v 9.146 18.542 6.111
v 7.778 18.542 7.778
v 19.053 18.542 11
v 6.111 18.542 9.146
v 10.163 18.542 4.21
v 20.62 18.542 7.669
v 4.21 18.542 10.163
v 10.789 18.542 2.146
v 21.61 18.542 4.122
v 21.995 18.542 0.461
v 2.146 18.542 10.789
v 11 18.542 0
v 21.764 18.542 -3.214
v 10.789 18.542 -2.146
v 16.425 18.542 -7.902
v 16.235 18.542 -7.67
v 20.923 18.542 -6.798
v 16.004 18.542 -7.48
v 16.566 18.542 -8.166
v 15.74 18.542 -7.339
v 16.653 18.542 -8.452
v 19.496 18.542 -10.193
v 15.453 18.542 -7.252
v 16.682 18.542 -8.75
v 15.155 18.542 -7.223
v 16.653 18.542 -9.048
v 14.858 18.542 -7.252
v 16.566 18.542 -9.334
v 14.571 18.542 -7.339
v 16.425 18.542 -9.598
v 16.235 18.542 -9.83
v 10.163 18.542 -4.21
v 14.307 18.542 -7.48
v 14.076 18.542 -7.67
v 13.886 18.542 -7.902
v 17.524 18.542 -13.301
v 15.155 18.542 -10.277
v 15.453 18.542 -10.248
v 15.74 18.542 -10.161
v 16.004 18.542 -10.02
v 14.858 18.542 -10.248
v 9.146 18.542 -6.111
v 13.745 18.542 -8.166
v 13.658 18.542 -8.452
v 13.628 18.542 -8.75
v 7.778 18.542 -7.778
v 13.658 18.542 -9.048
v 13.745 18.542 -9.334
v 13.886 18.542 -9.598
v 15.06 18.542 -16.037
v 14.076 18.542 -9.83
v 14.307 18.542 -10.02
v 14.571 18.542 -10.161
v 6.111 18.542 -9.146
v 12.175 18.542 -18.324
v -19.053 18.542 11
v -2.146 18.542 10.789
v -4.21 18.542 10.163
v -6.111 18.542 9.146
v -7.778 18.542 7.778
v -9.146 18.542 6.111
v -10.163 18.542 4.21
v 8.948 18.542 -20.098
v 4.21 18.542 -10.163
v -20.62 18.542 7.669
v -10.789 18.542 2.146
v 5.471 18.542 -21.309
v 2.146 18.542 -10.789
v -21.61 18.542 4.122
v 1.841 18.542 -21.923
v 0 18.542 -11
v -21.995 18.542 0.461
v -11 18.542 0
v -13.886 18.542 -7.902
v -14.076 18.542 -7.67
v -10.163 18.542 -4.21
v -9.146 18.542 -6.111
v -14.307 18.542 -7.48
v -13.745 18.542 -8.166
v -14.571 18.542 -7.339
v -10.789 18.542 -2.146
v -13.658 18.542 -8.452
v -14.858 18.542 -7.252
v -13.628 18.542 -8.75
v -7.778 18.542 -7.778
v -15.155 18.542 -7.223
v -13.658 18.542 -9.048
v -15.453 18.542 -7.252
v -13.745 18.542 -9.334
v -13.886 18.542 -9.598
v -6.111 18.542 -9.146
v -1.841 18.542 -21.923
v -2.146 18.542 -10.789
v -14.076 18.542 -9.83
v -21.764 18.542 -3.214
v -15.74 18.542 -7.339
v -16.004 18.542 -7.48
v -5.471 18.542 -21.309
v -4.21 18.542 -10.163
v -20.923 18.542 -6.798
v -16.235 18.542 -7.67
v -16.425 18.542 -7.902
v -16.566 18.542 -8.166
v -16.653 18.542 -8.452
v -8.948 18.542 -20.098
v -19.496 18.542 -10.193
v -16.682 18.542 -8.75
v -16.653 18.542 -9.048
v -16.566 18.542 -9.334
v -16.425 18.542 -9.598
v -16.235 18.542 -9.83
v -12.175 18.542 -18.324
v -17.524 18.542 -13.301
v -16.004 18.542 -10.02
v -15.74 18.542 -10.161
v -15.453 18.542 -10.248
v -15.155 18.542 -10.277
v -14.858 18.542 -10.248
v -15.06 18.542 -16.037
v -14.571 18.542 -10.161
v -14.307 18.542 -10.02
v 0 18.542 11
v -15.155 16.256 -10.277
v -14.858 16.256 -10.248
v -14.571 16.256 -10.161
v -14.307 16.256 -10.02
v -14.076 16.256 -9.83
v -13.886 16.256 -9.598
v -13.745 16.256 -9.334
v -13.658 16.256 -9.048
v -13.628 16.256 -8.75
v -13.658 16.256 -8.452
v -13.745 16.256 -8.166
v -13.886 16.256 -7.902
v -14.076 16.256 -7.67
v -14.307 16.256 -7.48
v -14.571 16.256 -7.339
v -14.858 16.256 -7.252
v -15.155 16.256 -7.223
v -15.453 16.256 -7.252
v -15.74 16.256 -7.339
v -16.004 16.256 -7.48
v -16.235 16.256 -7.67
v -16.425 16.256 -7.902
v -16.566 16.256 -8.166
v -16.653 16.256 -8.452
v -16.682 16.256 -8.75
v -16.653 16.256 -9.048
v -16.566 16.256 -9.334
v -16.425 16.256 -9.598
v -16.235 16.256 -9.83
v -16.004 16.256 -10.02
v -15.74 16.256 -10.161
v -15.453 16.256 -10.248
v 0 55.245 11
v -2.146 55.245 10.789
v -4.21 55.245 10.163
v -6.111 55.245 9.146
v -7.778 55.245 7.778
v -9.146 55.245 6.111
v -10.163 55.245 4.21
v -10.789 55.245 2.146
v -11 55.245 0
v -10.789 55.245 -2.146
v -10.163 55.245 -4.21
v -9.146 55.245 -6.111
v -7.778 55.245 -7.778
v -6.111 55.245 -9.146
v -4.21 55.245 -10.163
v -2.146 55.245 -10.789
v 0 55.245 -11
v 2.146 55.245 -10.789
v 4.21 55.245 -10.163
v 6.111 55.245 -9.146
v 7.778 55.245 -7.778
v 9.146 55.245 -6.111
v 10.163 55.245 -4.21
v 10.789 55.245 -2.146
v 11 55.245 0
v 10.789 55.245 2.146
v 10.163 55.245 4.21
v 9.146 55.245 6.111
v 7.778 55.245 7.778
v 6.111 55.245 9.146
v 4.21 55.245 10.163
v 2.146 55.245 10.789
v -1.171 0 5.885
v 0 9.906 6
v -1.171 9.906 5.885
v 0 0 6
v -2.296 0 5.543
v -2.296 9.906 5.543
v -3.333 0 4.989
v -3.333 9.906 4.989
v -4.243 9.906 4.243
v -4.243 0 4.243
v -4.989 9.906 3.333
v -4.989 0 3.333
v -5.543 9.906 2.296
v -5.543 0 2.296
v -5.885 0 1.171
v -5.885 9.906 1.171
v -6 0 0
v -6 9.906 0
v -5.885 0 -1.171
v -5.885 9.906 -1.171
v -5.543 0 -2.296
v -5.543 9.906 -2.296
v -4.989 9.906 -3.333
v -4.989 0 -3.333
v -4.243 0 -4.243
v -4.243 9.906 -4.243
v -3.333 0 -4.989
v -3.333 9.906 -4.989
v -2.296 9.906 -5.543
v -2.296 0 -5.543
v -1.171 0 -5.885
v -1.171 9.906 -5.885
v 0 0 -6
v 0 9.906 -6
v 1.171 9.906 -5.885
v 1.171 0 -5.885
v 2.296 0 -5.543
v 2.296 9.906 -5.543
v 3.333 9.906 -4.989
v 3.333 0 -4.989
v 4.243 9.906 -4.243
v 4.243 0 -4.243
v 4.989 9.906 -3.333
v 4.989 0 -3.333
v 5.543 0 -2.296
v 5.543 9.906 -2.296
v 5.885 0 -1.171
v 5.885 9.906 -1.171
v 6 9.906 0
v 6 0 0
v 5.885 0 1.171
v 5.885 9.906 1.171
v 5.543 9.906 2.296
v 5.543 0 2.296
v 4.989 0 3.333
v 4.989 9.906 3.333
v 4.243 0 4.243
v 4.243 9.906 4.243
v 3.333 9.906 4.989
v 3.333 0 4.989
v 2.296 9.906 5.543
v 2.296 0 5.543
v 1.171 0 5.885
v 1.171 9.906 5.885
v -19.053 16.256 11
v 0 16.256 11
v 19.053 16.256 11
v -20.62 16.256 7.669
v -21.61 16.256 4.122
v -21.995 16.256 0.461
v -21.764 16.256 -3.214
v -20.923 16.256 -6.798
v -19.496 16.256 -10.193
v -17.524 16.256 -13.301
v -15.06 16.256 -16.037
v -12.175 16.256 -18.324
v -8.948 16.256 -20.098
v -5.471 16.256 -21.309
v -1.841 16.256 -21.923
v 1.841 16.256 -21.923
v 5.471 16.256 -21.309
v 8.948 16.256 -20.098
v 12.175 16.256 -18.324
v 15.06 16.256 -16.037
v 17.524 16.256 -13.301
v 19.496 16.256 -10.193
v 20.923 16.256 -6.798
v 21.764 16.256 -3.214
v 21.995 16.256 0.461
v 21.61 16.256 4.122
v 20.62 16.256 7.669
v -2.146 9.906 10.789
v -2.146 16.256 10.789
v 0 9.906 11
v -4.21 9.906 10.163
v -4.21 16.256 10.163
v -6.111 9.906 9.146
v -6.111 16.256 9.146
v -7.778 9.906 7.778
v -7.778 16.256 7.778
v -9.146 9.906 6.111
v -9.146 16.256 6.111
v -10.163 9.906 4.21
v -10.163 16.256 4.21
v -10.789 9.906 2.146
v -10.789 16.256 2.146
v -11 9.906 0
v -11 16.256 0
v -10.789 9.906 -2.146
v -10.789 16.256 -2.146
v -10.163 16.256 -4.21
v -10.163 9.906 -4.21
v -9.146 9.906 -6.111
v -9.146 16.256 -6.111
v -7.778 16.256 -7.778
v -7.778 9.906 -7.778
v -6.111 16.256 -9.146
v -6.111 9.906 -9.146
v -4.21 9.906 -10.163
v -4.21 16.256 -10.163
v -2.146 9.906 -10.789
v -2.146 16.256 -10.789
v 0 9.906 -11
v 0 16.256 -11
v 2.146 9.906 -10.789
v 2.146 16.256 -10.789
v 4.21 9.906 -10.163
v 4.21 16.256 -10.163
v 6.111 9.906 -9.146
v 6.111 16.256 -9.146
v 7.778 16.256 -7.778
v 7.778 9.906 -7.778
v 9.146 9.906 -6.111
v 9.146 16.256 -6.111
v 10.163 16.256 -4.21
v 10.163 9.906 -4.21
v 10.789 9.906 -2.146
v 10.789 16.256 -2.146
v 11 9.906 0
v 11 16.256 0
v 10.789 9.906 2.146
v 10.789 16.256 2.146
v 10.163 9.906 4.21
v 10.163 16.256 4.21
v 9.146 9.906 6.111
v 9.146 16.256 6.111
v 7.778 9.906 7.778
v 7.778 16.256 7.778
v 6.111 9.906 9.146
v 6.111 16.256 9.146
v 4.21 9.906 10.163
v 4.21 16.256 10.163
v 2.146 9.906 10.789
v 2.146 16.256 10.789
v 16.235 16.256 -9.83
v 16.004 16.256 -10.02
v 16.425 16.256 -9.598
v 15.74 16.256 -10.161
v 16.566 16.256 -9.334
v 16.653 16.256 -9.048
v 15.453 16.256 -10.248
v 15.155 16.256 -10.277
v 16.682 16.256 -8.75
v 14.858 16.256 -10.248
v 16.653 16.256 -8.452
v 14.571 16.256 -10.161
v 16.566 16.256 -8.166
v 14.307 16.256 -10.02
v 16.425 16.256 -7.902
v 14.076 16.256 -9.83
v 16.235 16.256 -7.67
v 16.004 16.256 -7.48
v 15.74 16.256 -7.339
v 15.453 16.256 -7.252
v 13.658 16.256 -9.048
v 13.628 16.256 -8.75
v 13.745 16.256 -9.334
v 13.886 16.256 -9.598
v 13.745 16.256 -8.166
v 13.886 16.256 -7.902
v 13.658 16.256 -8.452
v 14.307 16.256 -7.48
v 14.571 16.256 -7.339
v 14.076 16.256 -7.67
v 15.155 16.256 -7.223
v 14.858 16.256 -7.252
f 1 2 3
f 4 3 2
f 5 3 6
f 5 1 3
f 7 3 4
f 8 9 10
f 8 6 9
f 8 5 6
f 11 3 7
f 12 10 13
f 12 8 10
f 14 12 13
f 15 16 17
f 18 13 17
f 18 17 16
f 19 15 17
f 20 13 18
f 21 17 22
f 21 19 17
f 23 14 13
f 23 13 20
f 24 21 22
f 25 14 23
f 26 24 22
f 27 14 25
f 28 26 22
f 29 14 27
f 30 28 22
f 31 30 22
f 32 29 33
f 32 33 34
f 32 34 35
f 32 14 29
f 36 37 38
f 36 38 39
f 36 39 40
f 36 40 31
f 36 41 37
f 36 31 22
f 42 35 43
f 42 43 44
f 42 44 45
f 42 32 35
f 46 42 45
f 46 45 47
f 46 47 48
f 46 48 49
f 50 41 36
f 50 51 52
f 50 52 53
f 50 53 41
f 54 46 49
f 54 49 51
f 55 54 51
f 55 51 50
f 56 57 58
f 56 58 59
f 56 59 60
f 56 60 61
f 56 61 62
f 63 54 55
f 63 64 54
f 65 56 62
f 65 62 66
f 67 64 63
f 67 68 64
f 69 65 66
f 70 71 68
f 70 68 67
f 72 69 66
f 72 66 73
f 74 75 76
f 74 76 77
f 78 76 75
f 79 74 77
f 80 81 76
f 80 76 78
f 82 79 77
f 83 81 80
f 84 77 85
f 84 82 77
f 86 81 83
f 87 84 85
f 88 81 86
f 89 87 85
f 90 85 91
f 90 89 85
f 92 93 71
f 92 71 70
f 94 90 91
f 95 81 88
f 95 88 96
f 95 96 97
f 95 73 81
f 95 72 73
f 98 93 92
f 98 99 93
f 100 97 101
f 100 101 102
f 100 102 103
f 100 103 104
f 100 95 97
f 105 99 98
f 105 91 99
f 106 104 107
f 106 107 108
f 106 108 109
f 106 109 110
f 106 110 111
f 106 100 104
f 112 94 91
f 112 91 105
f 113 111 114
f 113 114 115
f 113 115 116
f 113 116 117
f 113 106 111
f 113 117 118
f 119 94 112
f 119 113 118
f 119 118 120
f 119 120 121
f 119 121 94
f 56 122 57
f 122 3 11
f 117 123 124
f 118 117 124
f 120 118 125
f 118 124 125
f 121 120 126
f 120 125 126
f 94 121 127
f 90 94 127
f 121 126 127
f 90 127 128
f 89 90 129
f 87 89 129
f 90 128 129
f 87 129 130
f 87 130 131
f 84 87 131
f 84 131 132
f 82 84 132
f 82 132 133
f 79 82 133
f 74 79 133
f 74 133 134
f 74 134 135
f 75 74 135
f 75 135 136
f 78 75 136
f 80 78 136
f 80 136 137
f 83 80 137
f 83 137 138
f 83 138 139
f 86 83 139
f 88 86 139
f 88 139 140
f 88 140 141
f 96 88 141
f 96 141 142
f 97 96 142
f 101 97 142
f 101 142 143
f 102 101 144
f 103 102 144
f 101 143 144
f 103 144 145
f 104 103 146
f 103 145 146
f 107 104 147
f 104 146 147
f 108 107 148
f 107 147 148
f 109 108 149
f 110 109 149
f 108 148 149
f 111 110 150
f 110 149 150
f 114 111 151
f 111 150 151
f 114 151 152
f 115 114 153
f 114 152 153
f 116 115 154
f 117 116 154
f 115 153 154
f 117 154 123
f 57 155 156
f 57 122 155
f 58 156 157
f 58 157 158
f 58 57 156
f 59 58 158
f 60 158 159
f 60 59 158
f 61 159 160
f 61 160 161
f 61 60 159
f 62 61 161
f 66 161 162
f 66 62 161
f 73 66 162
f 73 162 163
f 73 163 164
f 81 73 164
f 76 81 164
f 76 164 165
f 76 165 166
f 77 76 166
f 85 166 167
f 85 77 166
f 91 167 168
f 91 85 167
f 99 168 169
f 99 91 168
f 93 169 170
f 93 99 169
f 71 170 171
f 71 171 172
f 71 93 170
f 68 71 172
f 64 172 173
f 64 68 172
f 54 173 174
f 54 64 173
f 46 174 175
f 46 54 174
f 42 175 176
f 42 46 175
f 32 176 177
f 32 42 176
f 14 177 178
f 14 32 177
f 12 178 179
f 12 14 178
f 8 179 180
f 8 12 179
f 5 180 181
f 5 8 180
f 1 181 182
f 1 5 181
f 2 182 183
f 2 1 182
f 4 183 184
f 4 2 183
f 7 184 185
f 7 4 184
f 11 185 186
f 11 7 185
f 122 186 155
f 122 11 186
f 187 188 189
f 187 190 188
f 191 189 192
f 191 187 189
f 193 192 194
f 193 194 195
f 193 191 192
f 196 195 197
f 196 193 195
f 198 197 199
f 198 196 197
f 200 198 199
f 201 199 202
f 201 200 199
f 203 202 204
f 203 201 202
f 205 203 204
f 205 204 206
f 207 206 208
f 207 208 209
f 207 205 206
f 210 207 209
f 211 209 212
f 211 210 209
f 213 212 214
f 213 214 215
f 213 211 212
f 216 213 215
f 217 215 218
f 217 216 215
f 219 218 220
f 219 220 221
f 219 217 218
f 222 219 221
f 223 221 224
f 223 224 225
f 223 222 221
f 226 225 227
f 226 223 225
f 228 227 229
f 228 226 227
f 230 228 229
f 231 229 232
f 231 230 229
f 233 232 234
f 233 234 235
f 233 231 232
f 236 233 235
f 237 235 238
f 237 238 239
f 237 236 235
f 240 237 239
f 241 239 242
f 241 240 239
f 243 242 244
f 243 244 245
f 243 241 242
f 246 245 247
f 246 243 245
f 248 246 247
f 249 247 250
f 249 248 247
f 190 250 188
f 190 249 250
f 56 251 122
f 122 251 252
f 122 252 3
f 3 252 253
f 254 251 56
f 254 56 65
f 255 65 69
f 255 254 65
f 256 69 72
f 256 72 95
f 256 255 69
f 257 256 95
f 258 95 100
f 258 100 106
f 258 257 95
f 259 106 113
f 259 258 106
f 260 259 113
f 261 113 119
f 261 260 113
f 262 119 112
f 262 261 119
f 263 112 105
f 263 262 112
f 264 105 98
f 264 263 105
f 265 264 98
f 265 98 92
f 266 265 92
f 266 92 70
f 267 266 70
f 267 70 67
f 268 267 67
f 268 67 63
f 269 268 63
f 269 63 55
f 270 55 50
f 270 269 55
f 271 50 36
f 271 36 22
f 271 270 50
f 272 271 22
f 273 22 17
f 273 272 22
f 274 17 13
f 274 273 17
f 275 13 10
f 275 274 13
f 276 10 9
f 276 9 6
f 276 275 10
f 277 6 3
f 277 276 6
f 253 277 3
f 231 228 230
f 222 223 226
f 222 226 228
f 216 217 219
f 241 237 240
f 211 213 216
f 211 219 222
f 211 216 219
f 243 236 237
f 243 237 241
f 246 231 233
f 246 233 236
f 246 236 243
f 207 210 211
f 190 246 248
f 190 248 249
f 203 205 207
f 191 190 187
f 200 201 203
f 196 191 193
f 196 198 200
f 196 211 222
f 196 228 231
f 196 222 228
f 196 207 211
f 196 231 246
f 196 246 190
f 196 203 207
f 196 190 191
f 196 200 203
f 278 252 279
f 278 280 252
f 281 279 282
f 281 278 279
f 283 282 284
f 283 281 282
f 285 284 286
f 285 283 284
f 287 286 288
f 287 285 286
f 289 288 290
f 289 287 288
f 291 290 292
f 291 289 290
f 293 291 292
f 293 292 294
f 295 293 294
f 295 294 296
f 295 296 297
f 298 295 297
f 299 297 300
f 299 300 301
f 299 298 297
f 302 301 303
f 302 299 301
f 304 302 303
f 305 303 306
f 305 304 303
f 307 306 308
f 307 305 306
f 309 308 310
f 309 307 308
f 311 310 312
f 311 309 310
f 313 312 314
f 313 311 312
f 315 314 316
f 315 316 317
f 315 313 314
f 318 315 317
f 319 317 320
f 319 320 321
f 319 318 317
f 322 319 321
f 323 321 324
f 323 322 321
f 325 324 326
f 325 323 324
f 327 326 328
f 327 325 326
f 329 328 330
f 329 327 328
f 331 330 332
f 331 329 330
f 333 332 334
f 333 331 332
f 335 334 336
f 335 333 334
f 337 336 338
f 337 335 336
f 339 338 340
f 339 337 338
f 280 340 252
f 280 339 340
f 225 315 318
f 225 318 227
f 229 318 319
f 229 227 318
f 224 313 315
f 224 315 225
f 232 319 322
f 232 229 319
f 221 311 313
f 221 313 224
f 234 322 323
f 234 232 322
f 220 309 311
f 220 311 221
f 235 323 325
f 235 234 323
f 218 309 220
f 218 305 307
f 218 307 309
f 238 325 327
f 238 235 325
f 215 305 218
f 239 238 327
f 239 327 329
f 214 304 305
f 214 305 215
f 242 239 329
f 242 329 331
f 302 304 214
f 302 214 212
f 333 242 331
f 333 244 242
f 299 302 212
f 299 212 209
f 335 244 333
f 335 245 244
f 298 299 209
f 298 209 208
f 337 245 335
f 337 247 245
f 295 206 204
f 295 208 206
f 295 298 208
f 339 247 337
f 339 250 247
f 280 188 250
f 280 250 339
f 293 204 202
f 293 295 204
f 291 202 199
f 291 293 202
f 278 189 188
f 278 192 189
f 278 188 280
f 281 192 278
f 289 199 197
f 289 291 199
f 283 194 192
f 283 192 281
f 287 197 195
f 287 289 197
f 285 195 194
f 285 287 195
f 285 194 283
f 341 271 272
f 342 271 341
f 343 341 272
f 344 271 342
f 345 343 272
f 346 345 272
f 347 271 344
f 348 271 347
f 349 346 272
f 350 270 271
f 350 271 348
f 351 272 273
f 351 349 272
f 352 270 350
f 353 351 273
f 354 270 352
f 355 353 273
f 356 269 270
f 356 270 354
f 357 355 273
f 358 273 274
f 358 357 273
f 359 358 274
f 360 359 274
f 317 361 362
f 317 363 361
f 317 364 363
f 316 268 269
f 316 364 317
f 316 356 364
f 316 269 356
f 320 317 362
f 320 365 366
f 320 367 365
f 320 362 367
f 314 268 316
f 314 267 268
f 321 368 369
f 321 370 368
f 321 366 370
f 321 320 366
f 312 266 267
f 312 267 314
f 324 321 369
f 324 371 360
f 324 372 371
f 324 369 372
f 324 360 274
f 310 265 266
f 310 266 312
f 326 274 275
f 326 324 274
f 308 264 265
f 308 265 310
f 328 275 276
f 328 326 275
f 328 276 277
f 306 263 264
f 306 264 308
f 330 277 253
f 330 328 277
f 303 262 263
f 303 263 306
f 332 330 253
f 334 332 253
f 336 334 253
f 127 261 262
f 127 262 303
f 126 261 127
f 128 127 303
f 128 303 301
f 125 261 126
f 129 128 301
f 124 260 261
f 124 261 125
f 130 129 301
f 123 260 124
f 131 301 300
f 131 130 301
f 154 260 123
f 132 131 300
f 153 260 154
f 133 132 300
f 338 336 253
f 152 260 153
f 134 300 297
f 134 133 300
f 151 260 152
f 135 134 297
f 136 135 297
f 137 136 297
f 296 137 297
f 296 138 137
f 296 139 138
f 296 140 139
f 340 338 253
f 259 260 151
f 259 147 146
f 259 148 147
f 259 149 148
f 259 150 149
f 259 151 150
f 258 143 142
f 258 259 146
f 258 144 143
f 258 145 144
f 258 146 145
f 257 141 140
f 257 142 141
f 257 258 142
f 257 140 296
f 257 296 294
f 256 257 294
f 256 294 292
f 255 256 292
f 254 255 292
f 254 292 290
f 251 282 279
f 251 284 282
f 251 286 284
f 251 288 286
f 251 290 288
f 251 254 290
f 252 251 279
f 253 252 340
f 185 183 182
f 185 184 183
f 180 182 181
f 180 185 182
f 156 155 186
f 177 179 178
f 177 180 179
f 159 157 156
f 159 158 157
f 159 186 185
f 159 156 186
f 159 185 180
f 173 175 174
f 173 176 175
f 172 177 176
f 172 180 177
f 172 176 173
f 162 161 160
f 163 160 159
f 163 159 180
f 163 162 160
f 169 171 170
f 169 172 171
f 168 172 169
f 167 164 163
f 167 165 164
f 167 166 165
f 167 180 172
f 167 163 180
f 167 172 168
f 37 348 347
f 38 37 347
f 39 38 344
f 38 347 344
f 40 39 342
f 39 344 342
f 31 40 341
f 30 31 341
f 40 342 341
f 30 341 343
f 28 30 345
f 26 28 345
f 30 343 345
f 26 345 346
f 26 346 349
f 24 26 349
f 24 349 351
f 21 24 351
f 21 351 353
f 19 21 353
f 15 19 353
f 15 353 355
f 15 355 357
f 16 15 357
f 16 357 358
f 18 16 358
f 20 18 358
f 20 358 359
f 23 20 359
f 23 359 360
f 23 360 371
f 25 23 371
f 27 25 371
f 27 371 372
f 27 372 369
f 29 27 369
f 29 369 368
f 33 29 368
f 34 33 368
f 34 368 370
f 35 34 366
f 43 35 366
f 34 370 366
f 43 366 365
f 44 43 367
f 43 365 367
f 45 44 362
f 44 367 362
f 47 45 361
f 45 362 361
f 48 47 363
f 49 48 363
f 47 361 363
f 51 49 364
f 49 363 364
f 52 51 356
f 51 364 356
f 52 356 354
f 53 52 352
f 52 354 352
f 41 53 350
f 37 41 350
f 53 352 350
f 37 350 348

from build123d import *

# Parameters (mm, degrees)
SKETCH2_R               = 1.526999994
CUT_EXTRUDE1_DEPTH      = 50.881280215
CUT_EXTRUDE2_DEPTH      = 49.115592108
CUT_EXTRUDE2_DEPTH_BACK = 49.115592108


with BuildPart() as part:
    # Sketch1 → Revolve1 (revolve)
    with BuildSketch(Plane(origin=(0, 0, 0), x_dir=(0, 0, -1), z_dir=(1, 0, 0)), mode=Mode.PRIVATE) as revolve1_sk:
        Polygon((10.999999971, 18.542), (21.999999942, 18.542), (21.999999942, 16.256), (10.999999971, 16.256), (10.999999971, 9.906), (5.999999938, 9.906), (5.999999938, 0), (0, 0), (0, 55.245), (10.999999971, 55.245), align=None)
    revolve(revolve1_sk.sketch.rotate(Axis((0, 55.245, 0), (0, -1, 0)), 180), axis=Axis((0, 55.245, 0), (0, -1, 0)))

    # Sketch2 → Cut-Extrude1 (cut, through all)
    with BuildSketch(Plane.XZ.offset(-16.256)):
        with Locations(Location((0, 17.500000052, 0), (0, 0, 270))):
            Circle(SKETCH2_R)
        with Locations(Location((15.155444611, -8.750000026, 0), (0, 0, 270))):
            Circle(SKETCH2_R)
        with Locations(Location((-15.155444611, -8.750000026, 0), (0, 0, 270))):
            Circle(SKETCH2_R)
    extrude(amount=-CUT_EXTRUDE1_DEPTH, mode=Mode.SUBTRACT)

    # Sketch4 → Cut-Extrude2 (cut, two sides: drawn at the far end of the back side and taken through both)
    with BuildSketch(Plane(origin=(0, 18.542, 0), x_dir=(1, 0, 0), z_dir=(0, 1, 0)).offset(-CUT_EXTRUDE2_DEPTH_BACK)):
        with BuildLine():
            Line((-19.052558833, -10.999999971), (19.052558833, -10.999999971))
            ThreePointArc((19.052558833, -10.999999971), (0, -21.999999942), (-19.052558833, -10.999999971))
        make_face()
    extrude(amount=CUT_EXTRUDE2_DEPTH + CUT_EXTRUDE2_DEPTH_BACK, mode=Mode.SUBTRACT)


solid = part.part
